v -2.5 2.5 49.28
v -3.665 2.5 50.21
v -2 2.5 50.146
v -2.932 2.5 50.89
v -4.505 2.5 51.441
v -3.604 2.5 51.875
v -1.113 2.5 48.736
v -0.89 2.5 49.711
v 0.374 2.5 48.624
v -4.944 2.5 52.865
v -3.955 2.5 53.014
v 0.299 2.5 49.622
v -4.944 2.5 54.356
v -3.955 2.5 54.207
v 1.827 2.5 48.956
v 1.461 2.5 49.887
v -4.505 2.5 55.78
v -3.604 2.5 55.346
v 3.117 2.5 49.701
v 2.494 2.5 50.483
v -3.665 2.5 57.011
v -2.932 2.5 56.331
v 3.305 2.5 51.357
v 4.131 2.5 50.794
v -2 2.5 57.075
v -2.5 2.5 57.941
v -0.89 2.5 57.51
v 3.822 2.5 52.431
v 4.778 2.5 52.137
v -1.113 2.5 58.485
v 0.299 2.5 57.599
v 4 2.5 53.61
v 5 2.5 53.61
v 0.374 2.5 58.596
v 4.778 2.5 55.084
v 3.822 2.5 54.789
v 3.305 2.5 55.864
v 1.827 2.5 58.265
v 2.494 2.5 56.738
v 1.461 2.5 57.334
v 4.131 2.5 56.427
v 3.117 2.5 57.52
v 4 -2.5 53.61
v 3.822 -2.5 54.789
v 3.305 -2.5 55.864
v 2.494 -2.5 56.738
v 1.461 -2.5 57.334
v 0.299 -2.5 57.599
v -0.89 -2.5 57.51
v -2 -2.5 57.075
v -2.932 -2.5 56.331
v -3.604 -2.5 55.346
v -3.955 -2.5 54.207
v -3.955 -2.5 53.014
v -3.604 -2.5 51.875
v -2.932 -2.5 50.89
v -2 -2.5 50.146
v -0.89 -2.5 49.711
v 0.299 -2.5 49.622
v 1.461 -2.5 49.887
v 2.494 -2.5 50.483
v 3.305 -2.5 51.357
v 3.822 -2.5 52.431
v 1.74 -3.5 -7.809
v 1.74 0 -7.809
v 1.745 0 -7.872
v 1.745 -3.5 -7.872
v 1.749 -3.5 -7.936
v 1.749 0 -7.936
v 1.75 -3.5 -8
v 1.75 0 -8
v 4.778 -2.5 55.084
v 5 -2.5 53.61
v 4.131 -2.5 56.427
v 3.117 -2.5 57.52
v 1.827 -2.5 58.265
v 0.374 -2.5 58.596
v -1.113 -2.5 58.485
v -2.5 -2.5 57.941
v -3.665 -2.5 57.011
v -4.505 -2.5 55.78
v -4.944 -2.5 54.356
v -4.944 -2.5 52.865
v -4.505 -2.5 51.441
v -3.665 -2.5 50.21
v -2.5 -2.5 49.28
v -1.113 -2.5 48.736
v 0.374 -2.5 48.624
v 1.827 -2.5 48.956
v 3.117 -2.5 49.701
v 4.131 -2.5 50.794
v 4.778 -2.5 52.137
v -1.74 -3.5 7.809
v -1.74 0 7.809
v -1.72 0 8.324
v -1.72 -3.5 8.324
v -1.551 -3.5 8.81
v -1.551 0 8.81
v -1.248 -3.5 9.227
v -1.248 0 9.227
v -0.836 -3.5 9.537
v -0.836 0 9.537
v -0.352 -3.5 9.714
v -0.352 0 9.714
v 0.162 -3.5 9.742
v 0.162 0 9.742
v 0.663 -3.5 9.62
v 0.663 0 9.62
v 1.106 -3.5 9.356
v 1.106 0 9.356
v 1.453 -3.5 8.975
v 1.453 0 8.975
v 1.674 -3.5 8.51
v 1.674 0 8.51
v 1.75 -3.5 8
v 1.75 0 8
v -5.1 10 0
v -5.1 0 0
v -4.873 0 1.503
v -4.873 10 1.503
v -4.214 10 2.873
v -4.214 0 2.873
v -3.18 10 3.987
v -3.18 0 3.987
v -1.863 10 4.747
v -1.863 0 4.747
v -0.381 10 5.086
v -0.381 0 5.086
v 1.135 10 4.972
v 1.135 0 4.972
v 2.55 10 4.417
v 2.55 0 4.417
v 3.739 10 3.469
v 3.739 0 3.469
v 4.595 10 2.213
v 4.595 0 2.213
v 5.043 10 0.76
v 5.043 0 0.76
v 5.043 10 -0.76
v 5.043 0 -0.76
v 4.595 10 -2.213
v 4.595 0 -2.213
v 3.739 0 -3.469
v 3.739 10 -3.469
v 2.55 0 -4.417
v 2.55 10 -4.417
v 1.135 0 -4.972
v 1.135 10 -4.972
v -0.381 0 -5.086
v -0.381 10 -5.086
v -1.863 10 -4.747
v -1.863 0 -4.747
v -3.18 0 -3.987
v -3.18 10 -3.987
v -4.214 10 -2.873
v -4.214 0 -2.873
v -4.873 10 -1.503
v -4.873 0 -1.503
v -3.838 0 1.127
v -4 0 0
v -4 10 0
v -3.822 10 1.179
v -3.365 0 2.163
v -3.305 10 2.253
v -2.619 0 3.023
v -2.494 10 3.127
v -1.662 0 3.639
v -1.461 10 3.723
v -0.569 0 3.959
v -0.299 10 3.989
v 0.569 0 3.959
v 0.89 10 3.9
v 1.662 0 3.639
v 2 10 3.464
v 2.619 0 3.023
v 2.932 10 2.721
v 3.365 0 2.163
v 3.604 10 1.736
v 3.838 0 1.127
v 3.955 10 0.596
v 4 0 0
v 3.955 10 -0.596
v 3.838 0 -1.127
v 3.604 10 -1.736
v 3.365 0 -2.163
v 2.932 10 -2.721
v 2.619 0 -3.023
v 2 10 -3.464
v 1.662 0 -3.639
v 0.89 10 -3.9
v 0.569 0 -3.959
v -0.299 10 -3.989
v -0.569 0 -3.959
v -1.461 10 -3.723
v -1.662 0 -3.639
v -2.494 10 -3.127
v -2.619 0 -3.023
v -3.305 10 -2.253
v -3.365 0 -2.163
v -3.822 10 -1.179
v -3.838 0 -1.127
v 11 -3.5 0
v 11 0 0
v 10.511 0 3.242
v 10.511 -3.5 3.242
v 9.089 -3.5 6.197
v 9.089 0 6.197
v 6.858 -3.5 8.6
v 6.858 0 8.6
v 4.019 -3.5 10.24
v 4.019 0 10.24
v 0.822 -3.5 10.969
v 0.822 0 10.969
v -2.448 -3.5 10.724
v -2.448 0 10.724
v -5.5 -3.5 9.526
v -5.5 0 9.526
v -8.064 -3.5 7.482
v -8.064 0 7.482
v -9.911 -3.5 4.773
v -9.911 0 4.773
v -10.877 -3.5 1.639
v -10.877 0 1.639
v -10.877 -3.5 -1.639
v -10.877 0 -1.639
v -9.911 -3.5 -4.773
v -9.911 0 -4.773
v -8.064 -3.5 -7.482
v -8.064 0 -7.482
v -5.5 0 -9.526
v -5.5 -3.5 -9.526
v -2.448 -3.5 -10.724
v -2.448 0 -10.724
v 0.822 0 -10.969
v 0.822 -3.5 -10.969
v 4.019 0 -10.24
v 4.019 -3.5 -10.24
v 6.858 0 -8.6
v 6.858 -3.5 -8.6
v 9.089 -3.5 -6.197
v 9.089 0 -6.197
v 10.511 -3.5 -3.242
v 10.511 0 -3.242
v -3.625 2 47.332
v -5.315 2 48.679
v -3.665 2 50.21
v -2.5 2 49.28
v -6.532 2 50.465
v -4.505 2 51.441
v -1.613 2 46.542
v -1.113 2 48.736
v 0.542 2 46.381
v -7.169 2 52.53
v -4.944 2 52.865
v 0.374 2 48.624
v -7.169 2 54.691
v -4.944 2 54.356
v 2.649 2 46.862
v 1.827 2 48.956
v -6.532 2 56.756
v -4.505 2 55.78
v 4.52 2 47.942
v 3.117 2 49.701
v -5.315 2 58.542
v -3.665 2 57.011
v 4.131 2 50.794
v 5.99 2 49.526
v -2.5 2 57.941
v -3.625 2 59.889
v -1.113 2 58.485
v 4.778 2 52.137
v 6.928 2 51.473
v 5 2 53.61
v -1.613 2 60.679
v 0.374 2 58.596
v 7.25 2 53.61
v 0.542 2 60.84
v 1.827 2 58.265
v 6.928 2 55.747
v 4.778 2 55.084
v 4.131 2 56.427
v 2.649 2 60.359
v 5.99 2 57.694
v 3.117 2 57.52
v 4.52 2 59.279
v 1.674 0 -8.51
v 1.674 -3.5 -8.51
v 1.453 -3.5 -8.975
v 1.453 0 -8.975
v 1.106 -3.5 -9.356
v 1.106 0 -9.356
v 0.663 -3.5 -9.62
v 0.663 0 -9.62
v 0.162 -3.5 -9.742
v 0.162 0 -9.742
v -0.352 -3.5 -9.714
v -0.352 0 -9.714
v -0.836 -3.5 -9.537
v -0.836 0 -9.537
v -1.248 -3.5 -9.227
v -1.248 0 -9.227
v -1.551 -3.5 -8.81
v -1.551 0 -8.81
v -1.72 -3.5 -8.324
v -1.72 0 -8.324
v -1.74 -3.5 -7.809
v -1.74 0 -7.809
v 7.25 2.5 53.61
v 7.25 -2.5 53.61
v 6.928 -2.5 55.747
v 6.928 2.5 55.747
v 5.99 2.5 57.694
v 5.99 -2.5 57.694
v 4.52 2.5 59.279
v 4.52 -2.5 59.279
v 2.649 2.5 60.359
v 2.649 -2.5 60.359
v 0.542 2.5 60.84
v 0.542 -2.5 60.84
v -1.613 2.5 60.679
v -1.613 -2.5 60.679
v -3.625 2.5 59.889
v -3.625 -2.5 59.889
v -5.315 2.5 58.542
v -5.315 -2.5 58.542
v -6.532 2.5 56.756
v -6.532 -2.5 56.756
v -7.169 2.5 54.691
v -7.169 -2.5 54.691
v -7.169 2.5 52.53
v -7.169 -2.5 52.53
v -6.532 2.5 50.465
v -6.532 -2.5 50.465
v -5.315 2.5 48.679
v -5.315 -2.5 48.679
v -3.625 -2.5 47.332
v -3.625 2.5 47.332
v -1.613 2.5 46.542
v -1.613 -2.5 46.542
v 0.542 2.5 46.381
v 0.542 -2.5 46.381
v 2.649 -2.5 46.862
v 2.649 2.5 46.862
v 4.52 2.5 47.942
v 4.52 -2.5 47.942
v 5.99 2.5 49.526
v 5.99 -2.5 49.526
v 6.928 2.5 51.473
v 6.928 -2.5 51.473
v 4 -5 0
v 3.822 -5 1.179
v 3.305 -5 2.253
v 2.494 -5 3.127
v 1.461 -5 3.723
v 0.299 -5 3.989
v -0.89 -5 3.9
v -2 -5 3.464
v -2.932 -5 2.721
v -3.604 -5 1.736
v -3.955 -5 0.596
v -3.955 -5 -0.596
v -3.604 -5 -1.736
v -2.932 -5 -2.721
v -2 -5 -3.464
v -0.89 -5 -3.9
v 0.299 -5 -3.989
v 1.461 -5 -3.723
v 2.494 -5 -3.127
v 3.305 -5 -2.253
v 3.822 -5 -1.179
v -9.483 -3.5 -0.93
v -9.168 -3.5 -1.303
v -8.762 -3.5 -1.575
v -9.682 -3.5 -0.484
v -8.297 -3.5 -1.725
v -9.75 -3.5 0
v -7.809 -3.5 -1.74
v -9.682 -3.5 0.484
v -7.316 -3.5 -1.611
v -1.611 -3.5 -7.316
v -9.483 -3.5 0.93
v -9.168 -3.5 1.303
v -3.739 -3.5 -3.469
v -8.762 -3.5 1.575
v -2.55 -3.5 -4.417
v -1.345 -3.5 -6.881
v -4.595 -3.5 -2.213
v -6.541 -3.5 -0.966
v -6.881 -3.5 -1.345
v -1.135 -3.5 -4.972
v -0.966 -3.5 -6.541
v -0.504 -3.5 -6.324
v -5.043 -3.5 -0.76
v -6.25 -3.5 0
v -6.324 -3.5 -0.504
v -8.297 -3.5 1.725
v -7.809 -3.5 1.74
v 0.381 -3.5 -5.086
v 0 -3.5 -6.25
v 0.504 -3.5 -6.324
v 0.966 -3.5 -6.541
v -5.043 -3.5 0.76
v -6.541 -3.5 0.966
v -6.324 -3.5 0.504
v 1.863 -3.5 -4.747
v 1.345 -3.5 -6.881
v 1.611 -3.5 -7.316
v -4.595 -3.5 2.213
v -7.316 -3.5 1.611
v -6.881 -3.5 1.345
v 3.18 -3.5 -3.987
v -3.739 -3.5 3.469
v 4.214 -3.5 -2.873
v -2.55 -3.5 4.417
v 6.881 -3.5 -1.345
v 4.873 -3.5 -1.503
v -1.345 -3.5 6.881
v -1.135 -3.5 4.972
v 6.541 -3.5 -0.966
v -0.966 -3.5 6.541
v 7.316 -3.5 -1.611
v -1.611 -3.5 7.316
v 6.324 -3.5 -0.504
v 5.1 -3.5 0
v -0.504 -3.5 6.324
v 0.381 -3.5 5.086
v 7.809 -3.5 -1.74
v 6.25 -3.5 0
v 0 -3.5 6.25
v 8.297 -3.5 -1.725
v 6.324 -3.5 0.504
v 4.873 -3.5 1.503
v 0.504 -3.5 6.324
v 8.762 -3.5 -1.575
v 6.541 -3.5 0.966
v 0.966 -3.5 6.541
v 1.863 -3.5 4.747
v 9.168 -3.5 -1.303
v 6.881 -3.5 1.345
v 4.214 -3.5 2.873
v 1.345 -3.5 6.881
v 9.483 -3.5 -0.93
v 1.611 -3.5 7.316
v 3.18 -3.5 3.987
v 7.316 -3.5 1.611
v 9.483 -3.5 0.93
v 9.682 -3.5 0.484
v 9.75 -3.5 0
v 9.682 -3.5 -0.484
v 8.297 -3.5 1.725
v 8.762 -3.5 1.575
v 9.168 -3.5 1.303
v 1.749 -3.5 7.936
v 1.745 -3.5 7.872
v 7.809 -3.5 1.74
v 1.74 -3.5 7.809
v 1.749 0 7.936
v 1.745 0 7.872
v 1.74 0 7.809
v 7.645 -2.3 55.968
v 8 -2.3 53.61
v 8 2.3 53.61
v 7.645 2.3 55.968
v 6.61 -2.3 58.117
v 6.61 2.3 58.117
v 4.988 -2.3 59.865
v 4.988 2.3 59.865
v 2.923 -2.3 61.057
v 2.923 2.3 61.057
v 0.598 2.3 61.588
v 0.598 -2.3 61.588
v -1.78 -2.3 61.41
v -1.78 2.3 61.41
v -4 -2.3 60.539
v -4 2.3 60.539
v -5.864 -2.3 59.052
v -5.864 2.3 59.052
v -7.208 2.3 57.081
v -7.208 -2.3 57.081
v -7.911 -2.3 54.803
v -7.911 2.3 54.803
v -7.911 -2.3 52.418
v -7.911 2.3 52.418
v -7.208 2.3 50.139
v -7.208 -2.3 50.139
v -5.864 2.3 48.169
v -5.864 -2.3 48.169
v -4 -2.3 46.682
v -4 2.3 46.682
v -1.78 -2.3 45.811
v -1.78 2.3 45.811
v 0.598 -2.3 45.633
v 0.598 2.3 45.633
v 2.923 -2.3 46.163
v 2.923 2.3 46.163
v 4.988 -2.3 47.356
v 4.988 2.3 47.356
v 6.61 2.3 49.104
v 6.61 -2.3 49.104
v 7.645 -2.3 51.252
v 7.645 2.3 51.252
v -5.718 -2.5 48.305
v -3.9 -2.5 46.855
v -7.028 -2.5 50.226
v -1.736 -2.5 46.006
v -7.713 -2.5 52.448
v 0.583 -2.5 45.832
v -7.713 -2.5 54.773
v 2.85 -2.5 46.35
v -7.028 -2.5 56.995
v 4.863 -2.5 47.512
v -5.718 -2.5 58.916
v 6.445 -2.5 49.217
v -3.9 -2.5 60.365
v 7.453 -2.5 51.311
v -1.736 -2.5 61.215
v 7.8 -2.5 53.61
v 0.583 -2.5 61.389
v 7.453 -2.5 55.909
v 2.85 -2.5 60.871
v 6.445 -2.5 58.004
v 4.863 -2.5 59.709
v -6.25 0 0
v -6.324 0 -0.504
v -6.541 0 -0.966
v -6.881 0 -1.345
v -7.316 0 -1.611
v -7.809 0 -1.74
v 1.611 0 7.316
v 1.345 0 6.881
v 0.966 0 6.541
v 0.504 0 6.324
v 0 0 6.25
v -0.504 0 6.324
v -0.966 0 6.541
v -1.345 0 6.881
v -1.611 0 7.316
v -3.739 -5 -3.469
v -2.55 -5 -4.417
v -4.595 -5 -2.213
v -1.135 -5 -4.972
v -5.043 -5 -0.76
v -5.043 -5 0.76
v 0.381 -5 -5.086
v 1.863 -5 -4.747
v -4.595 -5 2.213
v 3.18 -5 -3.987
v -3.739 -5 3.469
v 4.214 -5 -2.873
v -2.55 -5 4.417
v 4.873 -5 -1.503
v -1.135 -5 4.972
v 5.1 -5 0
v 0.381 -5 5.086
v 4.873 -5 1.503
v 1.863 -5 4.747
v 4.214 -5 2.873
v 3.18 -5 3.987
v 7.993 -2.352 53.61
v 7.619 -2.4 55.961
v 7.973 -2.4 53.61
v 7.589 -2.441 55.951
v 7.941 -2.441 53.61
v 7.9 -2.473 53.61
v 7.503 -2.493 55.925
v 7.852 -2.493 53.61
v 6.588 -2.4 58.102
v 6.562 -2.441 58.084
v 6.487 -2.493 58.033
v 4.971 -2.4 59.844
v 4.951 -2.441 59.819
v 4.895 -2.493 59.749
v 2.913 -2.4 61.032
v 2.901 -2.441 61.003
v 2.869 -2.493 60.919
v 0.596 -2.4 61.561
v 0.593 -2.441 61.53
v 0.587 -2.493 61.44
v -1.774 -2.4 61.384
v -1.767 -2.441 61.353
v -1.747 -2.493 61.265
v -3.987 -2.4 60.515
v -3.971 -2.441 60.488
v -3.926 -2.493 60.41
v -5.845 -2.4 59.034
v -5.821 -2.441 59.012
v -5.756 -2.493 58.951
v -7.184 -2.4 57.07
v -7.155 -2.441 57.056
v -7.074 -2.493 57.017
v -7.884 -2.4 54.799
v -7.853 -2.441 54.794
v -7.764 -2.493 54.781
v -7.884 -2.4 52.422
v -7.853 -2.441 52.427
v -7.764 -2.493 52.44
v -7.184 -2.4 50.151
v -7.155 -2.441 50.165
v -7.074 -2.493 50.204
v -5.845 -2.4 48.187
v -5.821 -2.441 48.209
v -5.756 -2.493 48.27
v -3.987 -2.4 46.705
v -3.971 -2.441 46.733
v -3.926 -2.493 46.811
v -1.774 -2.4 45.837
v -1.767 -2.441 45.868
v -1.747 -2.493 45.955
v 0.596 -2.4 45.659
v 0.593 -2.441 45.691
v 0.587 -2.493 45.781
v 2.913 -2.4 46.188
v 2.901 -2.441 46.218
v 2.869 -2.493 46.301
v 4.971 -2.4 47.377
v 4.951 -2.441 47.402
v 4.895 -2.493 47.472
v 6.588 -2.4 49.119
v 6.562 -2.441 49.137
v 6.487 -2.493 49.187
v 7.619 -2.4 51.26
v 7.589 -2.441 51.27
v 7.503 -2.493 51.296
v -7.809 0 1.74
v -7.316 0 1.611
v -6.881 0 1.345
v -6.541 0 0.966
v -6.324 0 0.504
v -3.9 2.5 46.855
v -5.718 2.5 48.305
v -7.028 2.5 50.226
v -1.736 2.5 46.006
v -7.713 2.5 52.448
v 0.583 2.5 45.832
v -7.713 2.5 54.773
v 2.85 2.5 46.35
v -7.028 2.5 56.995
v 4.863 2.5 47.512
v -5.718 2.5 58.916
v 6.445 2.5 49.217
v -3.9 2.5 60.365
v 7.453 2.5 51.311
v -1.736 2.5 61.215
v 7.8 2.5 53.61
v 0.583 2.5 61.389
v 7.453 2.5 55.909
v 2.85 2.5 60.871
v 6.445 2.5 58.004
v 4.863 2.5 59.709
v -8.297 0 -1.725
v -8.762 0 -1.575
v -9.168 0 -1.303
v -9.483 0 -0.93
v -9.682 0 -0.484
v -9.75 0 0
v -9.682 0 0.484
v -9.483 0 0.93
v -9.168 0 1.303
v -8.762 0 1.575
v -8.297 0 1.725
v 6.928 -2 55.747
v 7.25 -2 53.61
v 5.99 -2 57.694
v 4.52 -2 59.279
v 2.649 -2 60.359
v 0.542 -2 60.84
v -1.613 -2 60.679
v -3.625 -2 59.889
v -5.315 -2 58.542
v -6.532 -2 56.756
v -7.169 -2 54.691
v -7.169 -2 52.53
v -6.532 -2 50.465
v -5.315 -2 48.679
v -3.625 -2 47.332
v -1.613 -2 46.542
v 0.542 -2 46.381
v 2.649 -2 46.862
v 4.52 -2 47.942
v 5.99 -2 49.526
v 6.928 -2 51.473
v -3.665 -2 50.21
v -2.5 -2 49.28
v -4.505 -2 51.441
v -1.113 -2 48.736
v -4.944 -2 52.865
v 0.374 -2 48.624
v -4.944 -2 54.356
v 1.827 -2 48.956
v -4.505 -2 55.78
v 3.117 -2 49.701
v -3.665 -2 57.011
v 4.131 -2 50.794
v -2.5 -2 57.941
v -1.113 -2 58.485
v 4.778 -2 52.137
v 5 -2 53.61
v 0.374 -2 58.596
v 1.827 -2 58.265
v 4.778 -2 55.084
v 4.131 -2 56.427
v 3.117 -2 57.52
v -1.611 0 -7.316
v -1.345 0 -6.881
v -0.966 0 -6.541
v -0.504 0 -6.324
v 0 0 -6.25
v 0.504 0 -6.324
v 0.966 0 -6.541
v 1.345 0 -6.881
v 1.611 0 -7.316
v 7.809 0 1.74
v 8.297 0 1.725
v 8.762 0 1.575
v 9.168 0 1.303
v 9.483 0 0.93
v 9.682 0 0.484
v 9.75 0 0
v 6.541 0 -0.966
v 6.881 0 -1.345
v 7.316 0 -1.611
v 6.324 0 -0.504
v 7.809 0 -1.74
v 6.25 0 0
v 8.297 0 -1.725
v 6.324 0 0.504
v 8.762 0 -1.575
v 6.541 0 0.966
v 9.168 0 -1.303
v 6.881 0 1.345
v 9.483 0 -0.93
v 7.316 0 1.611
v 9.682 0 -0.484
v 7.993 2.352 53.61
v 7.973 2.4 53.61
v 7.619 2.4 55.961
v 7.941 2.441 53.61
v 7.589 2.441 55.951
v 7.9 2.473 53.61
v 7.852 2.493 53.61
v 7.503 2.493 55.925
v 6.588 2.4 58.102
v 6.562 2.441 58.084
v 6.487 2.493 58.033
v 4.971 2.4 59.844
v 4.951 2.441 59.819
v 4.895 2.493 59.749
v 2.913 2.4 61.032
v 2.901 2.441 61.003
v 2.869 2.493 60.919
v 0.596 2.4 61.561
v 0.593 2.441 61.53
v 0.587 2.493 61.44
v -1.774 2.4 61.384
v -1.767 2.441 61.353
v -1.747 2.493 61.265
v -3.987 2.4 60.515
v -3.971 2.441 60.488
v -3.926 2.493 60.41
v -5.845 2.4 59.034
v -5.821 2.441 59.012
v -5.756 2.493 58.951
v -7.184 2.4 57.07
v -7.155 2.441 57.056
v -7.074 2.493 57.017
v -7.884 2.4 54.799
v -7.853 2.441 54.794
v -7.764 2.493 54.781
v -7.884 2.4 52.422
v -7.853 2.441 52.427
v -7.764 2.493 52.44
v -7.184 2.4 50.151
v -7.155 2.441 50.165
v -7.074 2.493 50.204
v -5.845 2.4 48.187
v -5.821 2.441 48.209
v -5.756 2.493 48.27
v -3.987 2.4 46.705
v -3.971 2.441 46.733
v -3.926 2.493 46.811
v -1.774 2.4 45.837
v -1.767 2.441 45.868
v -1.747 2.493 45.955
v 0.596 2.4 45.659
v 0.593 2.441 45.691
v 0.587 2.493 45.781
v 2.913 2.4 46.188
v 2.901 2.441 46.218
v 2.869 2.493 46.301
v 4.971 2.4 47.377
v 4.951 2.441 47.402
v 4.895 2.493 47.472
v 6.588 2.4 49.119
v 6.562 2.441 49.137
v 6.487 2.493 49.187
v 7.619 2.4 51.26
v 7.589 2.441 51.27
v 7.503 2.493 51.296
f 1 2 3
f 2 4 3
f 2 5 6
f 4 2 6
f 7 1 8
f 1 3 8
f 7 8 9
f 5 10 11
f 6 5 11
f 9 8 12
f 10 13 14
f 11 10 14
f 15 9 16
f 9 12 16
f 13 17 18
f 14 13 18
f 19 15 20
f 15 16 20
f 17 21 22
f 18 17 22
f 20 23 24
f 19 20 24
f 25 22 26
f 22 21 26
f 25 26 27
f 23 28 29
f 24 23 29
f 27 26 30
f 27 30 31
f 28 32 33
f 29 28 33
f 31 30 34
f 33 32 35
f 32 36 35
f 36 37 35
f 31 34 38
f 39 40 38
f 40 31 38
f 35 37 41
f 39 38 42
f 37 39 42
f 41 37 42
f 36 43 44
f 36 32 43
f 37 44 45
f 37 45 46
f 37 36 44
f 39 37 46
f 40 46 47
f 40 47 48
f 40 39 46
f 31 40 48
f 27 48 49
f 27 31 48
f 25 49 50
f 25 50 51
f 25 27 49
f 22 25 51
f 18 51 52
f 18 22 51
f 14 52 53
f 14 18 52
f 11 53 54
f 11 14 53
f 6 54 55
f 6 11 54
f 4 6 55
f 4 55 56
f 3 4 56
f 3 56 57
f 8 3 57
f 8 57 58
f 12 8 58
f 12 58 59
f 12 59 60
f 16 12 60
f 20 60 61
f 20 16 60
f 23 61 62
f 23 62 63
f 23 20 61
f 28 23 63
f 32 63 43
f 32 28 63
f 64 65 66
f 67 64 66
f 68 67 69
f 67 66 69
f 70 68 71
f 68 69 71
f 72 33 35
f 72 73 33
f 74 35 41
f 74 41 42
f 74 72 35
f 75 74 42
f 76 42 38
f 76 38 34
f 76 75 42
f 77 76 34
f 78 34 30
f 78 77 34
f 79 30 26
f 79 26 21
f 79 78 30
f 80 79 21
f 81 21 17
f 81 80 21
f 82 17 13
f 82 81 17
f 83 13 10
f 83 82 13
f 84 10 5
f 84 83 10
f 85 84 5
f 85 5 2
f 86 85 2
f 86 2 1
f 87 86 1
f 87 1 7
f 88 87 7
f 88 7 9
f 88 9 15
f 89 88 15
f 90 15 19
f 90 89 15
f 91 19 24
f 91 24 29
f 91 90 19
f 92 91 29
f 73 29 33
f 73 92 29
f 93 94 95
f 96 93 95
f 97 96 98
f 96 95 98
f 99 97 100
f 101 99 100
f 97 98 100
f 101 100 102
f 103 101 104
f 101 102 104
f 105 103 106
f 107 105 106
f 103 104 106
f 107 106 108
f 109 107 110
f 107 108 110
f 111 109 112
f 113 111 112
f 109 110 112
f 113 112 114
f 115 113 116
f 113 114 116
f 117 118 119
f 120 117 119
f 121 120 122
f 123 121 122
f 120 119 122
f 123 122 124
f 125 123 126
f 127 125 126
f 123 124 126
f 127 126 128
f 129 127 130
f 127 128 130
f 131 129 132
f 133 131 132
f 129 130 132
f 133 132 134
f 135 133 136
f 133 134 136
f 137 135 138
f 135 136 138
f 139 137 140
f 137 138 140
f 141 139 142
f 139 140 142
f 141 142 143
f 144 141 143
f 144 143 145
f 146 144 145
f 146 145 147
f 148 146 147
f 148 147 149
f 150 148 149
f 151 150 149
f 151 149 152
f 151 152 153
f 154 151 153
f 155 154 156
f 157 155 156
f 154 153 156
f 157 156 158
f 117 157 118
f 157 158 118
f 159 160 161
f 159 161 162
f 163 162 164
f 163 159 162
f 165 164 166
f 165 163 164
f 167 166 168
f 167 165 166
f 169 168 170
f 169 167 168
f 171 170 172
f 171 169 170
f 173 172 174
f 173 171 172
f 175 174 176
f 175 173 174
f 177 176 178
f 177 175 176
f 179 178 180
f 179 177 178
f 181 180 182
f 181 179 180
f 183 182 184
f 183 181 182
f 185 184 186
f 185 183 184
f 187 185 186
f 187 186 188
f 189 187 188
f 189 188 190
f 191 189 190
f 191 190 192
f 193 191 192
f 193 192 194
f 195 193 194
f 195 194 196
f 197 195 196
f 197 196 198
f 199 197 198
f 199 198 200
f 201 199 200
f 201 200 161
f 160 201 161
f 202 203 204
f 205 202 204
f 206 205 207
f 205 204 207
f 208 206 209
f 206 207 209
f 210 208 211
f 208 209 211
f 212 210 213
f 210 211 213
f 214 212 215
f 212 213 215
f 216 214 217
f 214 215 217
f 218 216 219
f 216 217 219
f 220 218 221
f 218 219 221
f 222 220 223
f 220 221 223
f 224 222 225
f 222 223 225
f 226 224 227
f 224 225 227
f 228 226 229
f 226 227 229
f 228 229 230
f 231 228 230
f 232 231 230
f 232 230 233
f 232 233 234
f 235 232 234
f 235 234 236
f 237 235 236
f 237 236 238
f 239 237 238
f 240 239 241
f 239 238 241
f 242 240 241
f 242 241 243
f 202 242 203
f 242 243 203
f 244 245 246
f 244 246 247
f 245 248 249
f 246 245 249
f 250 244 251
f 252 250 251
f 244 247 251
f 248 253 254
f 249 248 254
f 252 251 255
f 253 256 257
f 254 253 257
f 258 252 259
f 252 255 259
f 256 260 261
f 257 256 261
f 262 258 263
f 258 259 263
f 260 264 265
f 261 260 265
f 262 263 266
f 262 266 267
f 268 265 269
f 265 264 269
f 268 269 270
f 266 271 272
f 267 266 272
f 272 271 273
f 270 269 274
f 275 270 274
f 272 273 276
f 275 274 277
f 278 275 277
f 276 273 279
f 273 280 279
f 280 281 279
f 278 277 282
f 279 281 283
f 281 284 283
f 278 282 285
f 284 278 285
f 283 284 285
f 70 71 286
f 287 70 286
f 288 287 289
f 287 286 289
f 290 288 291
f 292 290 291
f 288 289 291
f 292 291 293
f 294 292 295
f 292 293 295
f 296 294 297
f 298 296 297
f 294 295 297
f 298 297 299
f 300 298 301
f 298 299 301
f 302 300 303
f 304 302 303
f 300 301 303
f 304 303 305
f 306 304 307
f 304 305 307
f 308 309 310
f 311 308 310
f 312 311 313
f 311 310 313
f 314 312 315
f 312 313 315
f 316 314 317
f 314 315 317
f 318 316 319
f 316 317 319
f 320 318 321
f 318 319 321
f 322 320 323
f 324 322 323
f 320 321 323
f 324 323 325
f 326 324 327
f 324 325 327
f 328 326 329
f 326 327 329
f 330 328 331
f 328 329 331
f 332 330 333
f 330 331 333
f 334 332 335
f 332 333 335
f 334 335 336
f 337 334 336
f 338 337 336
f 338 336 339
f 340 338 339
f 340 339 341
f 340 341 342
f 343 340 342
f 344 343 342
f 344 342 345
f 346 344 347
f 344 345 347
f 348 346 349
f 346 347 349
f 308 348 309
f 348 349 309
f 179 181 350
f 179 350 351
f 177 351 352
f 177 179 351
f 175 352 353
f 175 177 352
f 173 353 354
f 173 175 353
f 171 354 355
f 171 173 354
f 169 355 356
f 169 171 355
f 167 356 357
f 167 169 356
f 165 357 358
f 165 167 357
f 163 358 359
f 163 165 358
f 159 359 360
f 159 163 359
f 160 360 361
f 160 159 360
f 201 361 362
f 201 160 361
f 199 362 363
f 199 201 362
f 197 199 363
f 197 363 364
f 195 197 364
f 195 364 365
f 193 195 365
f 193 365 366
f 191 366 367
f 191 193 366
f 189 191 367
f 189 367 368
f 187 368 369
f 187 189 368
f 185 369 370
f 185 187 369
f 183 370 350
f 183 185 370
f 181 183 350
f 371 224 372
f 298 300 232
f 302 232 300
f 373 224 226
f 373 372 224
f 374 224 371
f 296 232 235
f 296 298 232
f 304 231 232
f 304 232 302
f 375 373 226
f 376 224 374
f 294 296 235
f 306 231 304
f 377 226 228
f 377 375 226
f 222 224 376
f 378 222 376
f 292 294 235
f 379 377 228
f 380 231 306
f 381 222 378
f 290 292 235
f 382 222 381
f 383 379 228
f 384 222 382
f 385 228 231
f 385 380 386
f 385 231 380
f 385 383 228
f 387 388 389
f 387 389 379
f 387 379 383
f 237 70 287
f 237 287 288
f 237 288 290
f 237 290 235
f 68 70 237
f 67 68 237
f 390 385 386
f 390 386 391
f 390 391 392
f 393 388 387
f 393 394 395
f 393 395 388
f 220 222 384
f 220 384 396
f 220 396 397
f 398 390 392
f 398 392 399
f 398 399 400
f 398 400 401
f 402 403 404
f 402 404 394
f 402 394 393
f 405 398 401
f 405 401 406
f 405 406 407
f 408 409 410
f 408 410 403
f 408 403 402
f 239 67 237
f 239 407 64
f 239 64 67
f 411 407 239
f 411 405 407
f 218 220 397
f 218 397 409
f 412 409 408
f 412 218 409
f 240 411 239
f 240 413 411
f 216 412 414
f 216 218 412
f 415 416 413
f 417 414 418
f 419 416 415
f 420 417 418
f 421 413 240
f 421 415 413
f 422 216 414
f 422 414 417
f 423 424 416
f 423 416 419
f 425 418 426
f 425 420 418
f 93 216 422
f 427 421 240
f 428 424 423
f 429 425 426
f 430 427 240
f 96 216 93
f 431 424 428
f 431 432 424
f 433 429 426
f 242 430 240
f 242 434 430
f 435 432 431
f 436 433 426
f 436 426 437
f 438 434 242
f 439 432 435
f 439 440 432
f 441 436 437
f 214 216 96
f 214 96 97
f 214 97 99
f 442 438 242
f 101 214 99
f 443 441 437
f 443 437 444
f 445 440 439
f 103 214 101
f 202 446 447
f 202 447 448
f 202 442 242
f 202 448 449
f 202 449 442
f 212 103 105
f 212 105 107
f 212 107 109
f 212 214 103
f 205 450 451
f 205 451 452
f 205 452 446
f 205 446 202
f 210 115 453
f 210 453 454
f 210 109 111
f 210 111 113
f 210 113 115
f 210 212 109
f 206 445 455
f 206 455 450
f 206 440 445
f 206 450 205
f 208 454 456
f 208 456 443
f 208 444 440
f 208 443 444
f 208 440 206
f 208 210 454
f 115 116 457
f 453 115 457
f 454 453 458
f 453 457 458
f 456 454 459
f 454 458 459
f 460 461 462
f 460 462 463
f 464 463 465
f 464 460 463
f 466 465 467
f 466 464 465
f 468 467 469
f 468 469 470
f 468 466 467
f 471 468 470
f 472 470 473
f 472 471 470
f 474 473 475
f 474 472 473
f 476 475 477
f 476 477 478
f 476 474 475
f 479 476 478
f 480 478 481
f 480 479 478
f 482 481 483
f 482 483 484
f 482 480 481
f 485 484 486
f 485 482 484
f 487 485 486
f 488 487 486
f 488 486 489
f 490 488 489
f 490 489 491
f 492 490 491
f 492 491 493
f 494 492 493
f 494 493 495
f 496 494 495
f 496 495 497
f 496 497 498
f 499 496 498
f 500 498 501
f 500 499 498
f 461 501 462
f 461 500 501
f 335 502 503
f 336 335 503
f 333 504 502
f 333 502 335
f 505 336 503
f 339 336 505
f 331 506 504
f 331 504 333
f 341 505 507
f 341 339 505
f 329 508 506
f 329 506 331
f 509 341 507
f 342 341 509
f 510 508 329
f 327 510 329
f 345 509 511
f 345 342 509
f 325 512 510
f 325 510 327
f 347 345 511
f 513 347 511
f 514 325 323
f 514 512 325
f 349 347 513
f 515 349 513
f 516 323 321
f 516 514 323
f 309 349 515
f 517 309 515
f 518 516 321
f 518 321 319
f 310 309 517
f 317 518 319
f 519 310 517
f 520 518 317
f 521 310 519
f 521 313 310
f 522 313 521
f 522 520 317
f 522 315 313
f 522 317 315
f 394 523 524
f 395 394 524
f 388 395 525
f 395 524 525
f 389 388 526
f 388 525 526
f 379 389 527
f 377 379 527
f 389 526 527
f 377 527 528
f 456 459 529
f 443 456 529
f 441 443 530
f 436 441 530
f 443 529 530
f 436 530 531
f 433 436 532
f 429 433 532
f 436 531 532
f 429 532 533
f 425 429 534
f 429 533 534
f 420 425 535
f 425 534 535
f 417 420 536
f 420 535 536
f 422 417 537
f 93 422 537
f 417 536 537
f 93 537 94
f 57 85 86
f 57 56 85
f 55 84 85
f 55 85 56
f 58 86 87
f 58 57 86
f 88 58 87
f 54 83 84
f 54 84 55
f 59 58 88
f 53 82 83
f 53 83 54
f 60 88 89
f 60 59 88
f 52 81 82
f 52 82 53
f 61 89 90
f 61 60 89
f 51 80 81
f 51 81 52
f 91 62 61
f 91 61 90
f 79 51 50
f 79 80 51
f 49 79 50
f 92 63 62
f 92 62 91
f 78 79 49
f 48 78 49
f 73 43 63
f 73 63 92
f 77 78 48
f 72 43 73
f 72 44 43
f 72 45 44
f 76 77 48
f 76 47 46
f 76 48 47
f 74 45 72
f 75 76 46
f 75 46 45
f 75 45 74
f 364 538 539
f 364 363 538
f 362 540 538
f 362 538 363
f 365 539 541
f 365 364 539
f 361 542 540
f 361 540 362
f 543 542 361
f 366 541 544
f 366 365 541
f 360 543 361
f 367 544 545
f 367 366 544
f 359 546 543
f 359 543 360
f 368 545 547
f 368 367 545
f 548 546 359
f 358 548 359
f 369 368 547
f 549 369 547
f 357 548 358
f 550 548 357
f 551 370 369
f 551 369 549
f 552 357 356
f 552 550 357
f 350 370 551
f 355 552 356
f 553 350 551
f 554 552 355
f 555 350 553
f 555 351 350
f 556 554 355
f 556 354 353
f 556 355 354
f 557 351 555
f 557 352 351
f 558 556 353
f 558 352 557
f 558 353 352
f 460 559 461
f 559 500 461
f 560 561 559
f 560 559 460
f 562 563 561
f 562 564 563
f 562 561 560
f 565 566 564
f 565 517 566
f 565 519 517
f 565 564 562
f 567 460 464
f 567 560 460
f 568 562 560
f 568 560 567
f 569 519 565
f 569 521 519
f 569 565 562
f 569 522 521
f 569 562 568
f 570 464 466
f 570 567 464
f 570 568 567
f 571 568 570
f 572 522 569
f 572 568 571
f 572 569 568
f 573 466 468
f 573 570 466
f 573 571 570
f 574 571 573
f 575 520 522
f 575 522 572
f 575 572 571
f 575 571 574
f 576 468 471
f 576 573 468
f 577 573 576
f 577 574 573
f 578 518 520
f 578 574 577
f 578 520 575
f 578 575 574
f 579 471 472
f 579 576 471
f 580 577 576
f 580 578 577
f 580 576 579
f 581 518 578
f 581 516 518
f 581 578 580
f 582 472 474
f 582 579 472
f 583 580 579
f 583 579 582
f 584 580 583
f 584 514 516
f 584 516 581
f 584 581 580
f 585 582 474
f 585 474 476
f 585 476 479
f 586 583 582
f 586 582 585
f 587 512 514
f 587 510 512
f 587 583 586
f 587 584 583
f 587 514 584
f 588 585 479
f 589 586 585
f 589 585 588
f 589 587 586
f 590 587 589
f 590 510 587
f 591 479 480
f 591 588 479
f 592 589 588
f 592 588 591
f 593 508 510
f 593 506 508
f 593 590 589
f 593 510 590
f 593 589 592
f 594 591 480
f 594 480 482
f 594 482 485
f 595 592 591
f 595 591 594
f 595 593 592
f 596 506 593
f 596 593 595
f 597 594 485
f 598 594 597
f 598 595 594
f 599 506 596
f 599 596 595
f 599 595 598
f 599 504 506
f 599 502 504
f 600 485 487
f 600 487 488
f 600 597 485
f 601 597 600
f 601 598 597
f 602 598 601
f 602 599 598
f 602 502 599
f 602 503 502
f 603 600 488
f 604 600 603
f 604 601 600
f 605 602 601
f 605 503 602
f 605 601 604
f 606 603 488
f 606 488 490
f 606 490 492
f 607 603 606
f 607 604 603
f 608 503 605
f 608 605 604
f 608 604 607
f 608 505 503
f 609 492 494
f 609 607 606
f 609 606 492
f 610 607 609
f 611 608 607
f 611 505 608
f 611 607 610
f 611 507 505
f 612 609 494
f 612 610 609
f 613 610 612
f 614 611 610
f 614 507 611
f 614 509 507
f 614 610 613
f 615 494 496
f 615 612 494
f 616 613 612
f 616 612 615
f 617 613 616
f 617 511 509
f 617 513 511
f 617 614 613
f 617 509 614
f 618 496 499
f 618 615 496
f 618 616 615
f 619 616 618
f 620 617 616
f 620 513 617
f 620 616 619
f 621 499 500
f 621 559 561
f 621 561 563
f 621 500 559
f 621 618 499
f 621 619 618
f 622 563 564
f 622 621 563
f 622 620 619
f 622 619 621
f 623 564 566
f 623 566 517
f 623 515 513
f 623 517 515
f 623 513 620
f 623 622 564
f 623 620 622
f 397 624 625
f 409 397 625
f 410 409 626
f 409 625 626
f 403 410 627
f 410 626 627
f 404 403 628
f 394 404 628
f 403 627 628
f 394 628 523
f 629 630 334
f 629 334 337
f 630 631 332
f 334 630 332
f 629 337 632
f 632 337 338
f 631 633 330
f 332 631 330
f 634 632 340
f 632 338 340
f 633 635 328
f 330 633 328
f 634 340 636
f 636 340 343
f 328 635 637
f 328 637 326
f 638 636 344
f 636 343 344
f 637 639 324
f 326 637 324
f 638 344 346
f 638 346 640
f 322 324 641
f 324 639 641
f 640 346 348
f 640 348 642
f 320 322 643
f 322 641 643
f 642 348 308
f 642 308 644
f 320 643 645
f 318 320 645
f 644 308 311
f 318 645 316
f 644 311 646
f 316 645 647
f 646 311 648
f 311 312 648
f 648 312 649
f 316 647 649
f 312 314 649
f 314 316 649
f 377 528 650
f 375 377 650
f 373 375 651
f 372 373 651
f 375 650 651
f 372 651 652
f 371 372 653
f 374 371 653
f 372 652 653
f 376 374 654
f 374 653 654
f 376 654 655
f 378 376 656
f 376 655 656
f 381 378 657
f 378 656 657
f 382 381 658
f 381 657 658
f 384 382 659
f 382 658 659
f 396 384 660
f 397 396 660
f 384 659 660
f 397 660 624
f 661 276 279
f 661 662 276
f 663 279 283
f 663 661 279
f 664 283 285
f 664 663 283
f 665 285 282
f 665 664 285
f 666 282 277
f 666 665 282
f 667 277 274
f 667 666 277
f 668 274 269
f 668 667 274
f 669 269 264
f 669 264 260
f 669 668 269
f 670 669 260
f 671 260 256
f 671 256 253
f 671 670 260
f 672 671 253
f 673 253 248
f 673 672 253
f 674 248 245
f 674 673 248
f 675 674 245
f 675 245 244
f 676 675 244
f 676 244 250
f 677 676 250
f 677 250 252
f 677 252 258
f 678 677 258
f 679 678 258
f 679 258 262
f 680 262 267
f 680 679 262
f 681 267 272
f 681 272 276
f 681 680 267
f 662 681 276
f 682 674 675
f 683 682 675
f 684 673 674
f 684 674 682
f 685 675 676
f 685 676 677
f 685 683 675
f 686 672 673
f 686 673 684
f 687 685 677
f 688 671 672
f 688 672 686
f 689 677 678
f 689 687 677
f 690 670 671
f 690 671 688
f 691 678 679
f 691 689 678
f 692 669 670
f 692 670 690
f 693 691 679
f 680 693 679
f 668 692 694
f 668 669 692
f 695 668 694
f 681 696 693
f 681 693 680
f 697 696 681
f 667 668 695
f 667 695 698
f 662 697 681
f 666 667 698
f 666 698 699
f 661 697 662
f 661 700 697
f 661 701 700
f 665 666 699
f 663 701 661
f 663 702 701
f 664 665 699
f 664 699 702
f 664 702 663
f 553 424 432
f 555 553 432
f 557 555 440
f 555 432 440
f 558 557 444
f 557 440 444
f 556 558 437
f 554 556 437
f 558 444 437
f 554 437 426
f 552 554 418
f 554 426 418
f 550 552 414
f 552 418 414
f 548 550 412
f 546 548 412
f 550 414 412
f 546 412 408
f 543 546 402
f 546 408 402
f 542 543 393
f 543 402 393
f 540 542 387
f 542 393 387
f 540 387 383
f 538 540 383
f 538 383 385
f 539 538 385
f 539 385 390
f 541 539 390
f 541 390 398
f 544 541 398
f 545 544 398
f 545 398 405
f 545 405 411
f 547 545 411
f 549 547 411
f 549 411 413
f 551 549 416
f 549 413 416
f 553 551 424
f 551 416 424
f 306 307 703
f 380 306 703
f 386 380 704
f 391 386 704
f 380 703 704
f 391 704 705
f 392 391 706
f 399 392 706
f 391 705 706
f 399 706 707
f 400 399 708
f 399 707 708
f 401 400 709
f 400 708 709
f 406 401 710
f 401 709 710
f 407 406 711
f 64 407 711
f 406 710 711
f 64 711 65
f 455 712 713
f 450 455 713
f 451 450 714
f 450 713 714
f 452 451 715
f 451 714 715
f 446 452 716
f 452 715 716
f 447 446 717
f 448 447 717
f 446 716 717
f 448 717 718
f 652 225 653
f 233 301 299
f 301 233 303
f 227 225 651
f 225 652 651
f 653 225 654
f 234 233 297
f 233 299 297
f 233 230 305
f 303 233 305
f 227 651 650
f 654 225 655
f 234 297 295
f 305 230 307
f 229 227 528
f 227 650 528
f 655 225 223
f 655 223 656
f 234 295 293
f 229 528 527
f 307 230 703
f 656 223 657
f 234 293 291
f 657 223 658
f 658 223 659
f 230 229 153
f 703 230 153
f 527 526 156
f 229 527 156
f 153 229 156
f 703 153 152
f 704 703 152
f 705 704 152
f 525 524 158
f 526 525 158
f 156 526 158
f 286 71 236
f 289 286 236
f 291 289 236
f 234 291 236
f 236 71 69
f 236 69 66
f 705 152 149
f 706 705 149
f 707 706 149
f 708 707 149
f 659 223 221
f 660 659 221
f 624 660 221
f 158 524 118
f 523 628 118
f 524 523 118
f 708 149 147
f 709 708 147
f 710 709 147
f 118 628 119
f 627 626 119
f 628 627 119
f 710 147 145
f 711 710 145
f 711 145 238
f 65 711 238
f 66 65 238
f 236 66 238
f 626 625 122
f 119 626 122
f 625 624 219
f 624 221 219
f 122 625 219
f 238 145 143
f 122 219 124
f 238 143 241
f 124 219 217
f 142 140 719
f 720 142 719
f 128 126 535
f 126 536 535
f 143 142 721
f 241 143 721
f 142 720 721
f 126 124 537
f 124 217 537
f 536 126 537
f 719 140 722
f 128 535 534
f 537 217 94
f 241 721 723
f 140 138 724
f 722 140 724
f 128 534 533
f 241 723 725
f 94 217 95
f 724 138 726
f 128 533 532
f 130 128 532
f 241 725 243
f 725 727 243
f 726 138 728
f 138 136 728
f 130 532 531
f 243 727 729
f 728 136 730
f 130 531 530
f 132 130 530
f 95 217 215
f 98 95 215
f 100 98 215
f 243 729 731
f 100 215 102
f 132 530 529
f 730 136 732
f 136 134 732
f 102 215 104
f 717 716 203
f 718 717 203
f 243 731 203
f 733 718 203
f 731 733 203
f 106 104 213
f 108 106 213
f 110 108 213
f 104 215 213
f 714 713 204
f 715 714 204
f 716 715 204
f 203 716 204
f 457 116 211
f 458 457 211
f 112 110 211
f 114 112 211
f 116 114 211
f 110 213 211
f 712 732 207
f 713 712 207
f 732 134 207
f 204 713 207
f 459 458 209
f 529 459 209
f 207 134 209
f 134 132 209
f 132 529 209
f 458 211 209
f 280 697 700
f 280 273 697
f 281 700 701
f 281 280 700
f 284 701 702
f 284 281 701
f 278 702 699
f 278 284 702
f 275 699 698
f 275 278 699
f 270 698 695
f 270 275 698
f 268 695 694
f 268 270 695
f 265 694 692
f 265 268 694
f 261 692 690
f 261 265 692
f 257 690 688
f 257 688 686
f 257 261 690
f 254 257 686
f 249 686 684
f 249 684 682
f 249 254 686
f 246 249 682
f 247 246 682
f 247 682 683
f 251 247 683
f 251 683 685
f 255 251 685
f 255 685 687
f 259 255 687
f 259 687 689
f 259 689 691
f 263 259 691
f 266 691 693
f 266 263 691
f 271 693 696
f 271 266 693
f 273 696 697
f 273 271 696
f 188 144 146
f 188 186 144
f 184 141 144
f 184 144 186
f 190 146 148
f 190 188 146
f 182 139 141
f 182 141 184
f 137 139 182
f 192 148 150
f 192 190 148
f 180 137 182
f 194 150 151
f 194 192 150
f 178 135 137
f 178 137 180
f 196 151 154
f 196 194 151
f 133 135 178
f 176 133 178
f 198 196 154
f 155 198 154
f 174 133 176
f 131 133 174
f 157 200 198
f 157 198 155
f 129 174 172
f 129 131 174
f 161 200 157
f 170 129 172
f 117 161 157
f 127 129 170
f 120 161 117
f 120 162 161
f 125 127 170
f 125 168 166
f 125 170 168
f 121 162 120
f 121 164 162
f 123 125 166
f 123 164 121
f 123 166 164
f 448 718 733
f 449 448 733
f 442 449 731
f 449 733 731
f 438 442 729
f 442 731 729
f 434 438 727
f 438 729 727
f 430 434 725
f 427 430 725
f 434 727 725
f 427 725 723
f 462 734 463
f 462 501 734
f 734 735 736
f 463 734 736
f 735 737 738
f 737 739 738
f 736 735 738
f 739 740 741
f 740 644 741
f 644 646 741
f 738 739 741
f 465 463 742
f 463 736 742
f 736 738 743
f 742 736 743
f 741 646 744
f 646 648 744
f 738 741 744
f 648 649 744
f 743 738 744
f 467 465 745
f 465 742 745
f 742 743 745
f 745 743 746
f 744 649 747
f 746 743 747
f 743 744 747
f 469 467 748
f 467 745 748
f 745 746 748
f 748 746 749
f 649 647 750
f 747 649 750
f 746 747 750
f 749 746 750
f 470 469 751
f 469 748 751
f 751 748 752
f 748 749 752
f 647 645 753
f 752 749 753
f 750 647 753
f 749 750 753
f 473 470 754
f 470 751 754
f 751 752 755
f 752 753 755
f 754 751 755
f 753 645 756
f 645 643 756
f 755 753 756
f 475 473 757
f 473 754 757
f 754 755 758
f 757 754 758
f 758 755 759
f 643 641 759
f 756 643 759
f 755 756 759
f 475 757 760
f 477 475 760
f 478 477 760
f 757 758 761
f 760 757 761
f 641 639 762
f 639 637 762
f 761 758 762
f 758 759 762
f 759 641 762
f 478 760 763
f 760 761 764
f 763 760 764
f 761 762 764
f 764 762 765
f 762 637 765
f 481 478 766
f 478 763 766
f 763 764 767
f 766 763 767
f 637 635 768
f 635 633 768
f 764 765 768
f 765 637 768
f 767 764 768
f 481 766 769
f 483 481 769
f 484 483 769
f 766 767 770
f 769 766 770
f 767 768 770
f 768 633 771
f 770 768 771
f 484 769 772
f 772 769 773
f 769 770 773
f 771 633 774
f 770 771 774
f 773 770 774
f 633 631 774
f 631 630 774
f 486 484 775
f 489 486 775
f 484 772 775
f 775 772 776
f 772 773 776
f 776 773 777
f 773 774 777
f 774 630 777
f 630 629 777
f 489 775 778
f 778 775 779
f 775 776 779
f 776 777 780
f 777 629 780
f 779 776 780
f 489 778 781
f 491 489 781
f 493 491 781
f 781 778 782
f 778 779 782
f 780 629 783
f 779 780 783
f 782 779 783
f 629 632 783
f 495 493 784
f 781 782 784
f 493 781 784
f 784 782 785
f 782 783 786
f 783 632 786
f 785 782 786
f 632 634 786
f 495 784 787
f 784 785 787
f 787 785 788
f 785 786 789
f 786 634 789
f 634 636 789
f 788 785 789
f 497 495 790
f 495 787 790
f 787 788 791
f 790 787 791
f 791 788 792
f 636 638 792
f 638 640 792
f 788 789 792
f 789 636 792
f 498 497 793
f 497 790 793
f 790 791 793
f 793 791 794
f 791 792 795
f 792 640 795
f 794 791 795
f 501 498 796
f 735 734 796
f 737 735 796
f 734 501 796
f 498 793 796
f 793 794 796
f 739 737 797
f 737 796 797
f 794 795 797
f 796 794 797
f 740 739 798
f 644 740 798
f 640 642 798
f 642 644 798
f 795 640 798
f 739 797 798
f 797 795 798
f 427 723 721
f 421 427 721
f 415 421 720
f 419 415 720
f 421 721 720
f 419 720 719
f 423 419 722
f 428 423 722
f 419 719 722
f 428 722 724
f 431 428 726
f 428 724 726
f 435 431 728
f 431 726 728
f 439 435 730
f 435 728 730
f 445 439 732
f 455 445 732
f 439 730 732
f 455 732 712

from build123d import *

# Parameters (mm, degrees)
F0_R      = 11
F0_R_2    = 4
F1_DEPTH  = 3.5
F2_R      = 5.1
F2_R_2    = 4
F3_DEPTH  = 1.5
F4_R      = 5.1
F4_R_2    = 4
F5_DEPTH  = 10
F6_R      = 5
F6_R_2    = 4
F7_DEPTH  = 2.5
F8_R      = 7.25
F8_R_2    = 5
F9_DEPTH  = 2
F10_R     = 8
F10_R_2   = 7.25
F11_DEPTH = 5
F12_R     = 0.2


with BuildPart() as f1:
    # F0 (on Front) → F1 (new body)
    with BuildSketch(Plane.XZ):
        Circle(F0_R)
        with BuildLine():
            ThreePointArc((1.739501, 7.808594), (5.656854, 5.656854), (7.808594, 1.739501))
            ThreePointArc((7.808594, 1.739501), (9.167805, 1.303354), (9.75, 0))
            ThreePointArc((9.75, 0), (9.167805, -1.303354), (7.808594, -1.739501))
            ThreePointArc((7.808594, -1.739501), (5.656854, -5.656854), (1.739501, -7.808594))
            ThreePointArc((1.739501, -7.808594), (1.747373, -7.904153), (1.75, -8))
            ThreePointArc((1.75, -8), (-0.095847, -9.747373), (-1.739501, -7.808594))
            ThreePointArc((-1.739501, -7.808594), (-5.656854, -5.656854), (-7.808594, -1.739501))
            ThreePointArc((-7.808594, -1.739501), (-9.75, 0), (-7.808594, 1.739501))
            ThreePointArc((-7.808594, 1.739501), (-5.656854, 5.656854), (-1.739501, 7.808594))
            ThreePointArc((-1.739501, 7.808594), (-0.095847, 9.747373), (1.75, 8))
            ThreePointArc((1.75, 8), (1.747373, 7.904153), (1.739501, 7.808594))
        make_face(mode=Mode.SUBTRACT)
        with BuildLine():
            ThreePointArc((7.808594, -1.739501), (6.25, 0), (7.808594, 1.739501))
            ThreePointArc((7.808594, 1.739501), (5.656854, 5.656854), (1.739501, 7.808594))
            ThreePointArc((1.739501, 7.808594), (0, 6.25), (-1.739501, 7.808594))
            ThreePointArc((-1.739501, 7.808594), (-5.656854, 5.656854), (-7.808594, 1.739501))
            ThreePointArc((-7.808594, 1.739501), (-6.696646, 1.167805), (-6.25, 0))
            ThreePointArc((-6.25, 0), (-6.696646, -1.167805), (-7.808594, -1.739501))
            ThreePointArc((-7.808594, -1.739501), (-5.656854, -5.656854), (-1.739501, -7.808594))
            ThreePointArc((-1.739501, -7.808594), (0, -6.25), (1.739501, -7.808594))
            ThreePointArc((1.739501, -7.808594), (5.656854, -5.656854), (7.808594, -1.739501))
        make_face()
        Circle(F0_R_2, mode=Mode.SUBTRACT)
    extrude(amount=F1_DEPTH)

    # F2 (on face) → F3 (join)
    with BuildSketch(Plane.XZ.offset(3.5)):
        Circle(F2_R)
        Circle(F2_R_2, mode=Mode.SUBTRACT)
    extrude(amount=F3_DEPTH)

    # F4 (on face) → F5 (join)
    with BuildSketch(Plane(origin=(0, 0, 0), x_dir=(-1, 0, 0), z_dir=(0, 1, 0))):
        Circle(F4_R)
        Circle(F4_R_2, mode=Mode.SUBTRACT)
    extrude(amount=F5_DEPTH)


with BuildPart() as f7:
    # F6 (on Front) → F7 (new body, symmetric)
    with BuildSketch(Plane.XZ):
        with Locations((0, 53.610403)):
            Circle(F6_R)
        with Locations((0, 53.610403)):
            Circle(F6_R_2, mode=Mode.SUBTRACT)
    extrude(amount=F7_DEPTH, both=True)


with BuildPart() as f9:
    # F8 (on Front) → F9 (new body, symmetric)
    with BuildSketch(Plane.XZ):
        with Locations((0, 53.610403)):
            Circle(F8_R)
        with Locations((0, 53.610403)):
            Circle(F8_R_2, mode=Mode.SUBTRACT)
    extrude(amount=F9_DEPTH, both=True)


with BuildPart() as f11:
    # F10 (on face) → F11 (new body)
    with BuildSketch(Plane.XZ.offset(2.5)):
        with Locations((0, 53.610403)):
            Circle(F10_R)
        with Locations((0, 53.610403)):
            Circle(F10_R_2, mode=Mode.SUBTRACT)
    extrude(amount=-F11_DEPTH)

    # F12
    f12_edges = [f11.edges().sort_by_distance(p)[0] for p in [
        (-8, -2.5, 53.610403),
        (-8, 2.5, 53.610403),
    ]]
    fillet(f12_edges, radius=F12_R)


solid = Compound([f1.part, f7.part, f9.part, f11.part])
